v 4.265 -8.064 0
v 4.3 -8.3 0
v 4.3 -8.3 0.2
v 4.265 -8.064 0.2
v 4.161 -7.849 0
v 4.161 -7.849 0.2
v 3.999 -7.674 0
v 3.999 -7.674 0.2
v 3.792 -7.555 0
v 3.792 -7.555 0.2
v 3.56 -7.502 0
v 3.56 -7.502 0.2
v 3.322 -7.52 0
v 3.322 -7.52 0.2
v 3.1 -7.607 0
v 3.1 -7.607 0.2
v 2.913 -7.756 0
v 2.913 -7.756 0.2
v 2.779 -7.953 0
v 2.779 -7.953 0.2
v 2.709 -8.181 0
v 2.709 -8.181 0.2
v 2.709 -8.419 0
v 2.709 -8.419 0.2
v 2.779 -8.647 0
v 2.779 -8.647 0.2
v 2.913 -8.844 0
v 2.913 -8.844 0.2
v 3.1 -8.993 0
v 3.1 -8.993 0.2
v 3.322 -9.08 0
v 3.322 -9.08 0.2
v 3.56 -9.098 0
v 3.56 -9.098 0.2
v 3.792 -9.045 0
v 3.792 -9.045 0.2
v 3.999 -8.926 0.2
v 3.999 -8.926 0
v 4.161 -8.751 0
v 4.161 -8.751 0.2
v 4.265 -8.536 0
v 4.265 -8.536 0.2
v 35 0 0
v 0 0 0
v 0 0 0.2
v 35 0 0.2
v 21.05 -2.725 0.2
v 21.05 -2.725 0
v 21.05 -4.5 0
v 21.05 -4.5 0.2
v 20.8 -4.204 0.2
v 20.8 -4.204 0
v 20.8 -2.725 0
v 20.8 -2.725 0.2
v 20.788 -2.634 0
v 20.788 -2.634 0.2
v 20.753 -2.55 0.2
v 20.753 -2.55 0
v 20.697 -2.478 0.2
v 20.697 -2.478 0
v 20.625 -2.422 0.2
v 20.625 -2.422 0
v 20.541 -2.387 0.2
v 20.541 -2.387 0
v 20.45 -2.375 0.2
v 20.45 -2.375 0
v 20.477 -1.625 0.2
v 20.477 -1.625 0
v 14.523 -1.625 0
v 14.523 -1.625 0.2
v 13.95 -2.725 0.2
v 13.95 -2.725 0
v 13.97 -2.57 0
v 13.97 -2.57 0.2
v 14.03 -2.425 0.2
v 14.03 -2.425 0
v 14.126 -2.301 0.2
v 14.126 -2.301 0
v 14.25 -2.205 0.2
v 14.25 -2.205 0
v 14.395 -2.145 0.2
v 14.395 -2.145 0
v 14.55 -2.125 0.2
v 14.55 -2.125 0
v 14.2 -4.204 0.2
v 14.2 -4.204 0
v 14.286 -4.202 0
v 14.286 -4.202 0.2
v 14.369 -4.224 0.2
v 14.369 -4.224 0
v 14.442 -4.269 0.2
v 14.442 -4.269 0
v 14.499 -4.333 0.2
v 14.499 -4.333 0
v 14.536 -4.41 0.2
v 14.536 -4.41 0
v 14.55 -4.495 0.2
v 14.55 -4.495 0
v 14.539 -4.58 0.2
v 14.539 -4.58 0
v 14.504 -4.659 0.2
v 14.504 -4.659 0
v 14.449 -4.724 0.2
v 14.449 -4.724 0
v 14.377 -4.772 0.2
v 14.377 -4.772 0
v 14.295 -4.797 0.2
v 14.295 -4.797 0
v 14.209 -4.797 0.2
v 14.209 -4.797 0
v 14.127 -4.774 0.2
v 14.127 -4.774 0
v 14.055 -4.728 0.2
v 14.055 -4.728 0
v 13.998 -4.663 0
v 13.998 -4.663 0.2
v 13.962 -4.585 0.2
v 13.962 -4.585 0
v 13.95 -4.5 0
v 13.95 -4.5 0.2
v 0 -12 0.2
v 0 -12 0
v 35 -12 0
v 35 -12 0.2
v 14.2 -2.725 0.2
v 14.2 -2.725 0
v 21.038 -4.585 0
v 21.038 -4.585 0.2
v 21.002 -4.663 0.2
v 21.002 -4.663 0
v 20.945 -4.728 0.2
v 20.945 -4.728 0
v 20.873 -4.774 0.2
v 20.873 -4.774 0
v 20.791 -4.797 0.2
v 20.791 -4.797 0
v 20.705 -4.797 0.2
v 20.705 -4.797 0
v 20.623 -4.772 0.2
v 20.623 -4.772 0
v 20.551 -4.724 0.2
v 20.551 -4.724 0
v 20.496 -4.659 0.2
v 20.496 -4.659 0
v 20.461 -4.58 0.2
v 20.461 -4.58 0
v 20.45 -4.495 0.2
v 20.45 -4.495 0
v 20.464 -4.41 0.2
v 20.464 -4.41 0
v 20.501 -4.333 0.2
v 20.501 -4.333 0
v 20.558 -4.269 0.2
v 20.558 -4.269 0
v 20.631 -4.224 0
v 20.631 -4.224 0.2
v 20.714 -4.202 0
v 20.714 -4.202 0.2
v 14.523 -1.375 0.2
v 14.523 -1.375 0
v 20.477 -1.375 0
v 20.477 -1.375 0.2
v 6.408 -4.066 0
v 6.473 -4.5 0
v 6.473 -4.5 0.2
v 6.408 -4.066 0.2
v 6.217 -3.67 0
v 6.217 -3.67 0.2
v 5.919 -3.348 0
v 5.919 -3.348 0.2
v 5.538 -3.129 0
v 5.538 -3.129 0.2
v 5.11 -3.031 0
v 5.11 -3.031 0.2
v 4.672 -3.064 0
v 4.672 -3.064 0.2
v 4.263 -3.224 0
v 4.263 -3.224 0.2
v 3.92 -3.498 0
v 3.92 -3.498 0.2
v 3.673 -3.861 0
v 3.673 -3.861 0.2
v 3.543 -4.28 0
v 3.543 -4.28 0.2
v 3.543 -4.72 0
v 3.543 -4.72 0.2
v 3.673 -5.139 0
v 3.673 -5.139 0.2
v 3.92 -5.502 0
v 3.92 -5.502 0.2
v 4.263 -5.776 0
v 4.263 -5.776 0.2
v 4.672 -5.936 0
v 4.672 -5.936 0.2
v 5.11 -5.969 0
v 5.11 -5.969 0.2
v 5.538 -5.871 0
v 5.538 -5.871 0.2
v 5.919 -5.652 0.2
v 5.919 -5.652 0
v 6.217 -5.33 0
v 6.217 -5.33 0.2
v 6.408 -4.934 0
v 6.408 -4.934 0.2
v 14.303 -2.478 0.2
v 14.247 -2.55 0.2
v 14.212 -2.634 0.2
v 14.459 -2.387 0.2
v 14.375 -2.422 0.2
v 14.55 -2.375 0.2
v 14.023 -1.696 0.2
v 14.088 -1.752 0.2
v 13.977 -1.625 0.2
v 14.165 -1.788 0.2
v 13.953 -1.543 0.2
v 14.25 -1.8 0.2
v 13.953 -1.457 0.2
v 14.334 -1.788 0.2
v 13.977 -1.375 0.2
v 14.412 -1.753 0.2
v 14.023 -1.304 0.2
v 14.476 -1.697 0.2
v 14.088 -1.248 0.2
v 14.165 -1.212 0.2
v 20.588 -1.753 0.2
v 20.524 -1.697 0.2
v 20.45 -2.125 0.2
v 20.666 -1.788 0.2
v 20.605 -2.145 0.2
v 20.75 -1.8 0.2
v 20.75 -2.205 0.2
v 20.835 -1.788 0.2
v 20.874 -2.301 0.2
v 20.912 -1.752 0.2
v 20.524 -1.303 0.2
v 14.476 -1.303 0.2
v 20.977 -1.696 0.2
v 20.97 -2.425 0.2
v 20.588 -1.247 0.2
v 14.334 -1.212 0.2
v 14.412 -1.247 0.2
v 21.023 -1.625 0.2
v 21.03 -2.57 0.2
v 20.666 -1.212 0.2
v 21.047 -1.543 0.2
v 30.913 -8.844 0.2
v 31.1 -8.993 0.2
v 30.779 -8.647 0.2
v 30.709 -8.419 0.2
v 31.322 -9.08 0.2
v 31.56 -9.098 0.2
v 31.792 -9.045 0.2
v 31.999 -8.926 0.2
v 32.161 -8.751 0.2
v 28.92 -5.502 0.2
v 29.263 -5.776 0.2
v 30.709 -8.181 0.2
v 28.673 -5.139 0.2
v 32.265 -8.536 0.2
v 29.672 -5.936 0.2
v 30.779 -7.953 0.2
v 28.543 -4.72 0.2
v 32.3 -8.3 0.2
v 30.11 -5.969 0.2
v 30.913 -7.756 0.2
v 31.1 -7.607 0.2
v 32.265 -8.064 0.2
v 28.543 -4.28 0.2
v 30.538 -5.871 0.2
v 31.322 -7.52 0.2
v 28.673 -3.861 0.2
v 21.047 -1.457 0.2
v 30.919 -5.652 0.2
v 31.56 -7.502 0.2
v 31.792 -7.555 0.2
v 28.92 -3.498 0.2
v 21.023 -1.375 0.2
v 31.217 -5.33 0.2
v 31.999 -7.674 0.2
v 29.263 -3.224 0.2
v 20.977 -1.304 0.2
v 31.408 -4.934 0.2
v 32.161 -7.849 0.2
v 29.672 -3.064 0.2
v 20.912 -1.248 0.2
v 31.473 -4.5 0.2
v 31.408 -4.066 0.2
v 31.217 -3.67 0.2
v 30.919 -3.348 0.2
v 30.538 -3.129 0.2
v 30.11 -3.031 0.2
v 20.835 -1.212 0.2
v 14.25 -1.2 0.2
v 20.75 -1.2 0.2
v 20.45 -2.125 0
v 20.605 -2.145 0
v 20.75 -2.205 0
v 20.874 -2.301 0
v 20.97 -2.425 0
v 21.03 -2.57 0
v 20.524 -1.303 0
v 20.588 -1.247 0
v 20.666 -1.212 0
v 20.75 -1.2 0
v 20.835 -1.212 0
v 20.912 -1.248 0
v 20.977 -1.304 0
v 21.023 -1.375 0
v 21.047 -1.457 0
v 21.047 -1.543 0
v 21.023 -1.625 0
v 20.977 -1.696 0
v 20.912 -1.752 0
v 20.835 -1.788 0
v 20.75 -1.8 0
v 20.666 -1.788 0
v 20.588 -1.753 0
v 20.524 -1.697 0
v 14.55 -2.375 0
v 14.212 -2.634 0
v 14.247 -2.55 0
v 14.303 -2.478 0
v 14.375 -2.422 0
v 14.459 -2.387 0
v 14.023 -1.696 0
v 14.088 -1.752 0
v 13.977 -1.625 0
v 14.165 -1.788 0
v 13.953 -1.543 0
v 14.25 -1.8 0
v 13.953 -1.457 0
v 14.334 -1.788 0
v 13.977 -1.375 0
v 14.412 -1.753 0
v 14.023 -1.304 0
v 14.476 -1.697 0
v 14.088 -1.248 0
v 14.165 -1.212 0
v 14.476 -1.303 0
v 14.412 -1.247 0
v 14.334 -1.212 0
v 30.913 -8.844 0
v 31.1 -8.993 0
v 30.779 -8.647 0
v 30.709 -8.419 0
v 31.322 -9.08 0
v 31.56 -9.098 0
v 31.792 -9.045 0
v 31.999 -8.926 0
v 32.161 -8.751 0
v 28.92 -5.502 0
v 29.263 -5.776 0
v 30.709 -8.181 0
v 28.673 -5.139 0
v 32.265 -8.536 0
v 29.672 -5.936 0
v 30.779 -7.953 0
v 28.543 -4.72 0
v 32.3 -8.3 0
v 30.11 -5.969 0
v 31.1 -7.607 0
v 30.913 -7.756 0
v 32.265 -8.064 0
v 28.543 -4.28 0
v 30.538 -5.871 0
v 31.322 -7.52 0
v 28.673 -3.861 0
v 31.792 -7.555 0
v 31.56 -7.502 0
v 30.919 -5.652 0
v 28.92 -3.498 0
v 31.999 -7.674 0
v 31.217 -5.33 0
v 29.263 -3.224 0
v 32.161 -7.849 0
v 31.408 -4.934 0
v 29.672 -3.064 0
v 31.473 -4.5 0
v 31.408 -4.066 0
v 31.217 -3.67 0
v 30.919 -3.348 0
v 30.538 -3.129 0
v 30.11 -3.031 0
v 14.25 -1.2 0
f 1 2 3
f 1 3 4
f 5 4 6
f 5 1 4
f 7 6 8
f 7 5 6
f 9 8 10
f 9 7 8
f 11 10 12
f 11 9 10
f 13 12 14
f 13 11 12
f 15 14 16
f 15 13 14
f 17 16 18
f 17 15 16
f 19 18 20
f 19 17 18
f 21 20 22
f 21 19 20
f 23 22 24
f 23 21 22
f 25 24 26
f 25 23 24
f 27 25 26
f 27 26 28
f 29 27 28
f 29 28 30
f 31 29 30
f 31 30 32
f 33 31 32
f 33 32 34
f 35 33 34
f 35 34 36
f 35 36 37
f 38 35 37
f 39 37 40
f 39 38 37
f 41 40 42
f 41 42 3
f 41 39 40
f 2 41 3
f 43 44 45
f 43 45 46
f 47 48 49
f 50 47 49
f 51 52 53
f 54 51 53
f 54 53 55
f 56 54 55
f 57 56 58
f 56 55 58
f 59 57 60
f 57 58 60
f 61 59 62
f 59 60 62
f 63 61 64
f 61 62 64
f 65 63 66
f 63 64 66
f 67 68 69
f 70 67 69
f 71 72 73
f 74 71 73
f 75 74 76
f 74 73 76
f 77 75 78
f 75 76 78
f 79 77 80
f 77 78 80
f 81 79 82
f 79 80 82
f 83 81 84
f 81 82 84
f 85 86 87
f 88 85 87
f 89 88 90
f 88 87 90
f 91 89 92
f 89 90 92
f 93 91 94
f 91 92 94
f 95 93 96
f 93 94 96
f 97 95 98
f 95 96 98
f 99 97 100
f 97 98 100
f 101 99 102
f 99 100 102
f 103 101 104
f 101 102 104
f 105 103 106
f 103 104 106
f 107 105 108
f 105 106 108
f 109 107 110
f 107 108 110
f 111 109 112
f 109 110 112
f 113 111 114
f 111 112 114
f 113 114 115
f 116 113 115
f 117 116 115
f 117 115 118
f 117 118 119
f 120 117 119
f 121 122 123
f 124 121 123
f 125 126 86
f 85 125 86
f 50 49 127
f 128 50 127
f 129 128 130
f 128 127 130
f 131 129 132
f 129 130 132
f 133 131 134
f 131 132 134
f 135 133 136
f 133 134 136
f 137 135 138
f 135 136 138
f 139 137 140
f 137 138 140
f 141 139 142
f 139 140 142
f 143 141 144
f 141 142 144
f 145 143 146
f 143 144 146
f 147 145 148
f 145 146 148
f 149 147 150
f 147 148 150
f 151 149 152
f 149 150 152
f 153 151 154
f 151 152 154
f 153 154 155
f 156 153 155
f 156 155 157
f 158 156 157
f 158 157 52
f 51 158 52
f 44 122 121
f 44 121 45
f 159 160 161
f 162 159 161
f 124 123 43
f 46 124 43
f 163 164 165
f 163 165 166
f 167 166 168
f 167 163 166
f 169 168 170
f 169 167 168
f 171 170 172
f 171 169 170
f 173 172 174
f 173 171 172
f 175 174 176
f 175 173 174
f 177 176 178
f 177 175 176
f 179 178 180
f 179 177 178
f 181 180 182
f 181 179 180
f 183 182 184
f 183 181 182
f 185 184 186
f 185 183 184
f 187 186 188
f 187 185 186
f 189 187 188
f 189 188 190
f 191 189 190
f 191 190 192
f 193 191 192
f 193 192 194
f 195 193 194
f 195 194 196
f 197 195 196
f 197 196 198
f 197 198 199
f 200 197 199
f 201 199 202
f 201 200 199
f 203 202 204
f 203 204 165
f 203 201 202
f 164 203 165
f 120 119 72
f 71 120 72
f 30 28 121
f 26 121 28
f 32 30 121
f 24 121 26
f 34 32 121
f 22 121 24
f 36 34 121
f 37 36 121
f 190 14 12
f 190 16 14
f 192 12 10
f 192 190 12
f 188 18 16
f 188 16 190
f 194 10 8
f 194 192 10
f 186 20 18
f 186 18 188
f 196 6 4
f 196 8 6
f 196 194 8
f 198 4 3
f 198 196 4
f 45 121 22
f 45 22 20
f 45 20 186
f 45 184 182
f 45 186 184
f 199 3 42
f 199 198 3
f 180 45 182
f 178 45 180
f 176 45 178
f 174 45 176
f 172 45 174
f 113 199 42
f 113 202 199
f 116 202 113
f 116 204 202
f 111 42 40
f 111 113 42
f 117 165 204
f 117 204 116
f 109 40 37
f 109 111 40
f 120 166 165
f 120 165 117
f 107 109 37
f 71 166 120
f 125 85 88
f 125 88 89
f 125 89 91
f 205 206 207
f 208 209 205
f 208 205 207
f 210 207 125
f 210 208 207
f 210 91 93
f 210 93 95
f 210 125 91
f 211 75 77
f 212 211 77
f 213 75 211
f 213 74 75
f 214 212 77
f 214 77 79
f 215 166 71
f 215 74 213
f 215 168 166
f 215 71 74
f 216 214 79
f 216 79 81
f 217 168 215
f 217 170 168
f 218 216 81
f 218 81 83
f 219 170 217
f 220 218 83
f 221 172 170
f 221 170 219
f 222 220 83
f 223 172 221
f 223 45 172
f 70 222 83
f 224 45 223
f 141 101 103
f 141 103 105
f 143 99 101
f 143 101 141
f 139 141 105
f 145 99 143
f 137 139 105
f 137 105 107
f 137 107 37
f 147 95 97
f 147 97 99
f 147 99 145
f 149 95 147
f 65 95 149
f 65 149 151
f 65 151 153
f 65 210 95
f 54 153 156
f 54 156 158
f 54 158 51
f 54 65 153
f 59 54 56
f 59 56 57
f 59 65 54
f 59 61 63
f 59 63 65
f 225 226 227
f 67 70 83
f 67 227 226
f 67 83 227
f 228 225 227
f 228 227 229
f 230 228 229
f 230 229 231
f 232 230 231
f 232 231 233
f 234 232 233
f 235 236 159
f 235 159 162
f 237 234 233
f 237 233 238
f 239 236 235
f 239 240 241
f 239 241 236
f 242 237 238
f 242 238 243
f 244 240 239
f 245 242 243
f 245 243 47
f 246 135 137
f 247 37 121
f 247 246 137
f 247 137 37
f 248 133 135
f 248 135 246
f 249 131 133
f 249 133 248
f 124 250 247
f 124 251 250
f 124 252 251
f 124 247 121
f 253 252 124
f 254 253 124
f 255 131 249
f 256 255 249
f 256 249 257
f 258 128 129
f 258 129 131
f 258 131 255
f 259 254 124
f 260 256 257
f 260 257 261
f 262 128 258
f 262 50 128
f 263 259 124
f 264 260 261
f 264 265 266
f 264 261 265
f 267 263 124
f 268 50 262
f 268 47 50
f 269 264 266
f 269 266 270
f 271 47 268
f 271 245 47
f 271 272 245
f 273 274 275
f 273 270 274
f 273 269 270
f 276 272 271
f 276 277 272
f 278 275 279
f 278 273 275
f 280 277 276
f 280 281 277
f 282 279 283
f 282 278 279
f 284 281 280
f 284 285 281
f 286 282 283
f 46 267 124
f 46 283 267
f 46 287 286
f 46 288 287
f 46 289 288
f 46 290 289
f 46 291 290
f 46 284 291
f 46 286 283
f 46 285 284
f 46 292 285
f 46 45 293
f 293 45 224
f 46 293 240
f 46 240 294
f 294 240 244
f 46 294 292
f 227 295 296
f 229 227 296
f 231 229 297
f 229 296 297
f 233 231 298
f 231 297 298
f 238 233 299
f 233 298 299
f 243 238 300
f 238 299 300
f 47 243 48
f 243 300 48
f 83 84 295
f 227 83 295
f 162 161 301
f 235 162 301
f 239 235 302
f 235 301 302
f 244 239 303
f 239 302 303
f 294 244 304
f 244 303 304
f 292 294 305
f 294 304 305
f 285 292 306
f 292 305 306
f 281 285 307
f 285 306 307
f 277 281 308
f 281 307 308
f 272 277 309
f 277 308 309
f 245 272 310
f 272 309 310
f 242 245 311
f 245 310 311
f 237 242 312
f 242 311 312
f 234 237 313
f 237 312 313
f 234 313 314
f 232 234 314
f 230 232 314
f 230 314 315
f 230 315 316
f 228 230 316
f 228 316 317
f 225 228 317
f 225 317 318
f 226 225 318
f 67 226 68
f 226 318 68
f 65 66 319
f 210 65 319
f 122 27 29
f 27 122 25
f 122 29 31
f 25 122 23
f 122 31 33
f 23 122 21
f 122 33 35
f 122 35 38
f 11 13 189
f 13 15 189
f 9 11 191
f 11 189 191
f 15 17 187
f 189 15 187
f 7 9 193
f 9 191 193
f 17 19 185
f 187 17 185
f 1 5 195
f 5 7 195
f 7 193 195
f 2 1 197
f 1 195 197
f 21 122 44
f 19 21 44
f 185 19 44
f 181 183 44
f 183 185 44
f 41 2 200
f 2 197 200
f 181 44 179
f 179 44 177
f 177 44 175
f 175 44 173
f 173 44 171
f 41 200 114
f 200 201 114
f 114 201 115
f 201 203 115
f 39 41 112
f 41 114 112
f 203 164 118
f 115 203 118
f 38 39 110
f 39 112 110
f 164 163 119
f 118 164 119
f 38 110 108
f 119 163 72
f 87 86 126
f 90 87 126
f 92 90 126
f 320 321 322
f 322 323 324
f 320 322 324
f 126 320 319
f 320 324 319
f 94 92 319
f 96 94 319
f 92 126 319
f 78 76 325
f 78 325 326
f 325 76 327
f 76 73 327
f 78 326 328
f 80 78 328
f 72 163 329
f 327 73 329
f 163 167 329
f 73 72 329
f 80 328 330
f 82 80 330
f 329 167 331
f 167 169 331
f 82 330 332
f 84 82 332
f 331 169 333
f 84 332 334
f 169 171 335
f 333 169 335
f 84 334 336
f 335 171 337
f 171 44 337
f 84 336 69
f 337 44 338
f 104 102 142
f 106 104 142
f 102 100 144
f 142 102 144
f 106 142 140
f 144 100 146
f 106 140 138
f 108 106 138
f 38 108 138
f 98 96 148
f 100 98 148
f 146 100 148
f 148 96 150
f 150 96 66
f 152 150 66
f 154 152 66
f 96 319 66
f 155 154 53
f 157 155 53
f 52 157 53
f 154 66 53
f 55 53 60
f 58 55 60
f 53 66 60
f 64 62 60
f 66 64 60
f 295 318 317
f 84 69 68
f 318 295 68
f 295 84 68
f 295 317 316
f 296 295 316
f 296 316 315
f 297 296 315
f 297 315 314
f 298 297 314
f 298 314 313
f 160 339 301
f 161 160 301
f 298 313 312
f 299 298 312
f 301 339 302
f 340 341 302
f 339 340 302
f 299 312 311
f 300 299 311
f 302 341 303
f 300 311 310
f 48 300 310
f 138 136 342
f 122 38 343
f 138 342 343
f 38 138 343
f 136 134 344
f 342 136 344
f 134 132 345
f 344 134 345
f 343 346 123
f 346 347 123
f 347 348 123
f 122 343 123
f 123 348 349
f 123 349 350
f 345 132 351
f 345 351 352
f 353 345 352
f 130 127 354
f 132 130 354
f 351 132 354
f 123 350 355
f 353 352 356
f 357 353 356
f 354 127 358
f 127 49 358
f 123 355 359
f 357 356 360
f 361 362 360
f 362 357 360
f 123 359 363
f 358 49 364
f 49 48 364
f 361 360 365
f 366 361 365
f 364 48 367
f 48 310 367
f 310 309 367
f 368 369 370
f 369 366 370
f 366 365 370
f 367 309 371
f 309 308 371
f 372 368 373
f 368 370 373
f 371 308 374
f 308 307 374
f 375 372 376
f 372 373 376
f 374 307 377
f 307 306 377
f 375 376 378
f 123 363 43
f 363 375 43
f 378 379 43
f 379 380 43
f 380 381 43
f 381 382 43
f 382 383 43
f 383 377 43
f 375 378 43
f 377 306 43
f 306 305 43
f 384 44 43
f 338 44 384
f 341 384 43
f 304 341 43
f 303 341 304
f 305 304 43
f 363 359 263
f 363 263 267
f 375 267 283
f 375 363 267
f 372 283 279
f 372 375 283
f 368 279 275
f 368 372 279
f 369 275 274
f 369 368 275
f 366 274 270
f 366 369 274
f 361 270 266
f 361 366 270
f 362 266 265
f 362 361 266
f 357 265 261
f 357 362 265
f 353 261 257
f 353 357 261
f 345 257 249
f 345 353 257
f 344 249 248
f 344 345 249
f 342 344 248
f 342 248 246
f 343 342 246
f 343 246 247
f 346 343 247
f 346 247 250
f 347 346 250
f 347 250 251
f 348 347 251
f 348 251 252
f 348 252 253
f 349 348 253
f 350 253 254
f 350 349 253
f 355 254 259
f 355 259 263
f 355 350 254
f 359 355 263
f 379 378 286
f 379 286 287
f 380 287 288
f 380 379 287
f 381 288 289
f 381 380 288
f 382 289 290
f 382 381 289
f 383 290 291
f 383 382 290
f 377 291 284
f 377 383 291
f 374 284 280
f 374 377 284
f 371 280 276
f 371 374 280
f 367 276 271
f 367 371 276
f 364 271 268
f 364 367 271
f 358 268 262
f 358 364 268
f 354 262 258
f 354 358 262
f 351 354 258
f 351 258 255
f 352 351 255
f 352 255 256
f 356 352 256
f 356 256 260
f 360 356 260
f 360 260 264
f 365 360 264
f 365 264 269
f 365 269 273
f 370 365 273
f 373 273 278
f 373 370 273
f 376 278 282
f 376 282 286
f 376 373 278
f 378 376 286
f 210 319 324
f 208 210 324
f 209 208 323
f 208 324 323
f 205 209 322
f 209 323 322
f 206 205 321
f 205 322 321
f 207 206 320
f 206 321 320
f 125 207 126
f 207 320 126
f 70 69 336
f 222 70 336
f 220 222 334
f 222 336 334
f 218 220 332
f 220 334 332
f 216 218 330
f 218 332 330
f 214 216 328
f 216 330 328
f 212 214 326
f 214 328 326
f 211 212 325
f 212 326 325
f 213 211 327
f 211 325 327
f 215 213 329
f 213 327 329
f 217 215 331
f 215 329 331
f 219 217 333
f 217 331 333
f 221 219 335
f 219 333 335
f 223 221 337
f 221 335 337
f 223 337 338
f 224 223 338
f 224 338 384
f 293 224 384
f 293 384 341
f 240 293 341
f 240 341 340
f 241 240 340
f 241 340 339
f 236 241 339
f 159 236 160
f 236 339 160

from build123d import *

# Parameters (mm, degrees)
SKETCH1_W           = 35
SKETCH1_H           = 12
SKETCH1_R           = 0.8001
SKETCH1_R_2         = 1.4732
BOSS_EXTRUDE1_DEPTH = 0.2


with BuildPart() as part:
    # Sketch1 → Boss-Extrude1 (new body)
    with BuildSketch(Plane.XY):
        with Locations((17.5, -6)):
            Rectangle(SKETCH1_W, SKETCH1_H)
        with Locations((3.5, -8.3)):
            Circle(SKETCH1_R, mode=Mode.SUBTRACT)
        with Locations((5, -4.5)):
            Circle(SKETCH1_R_2, mode=Mode.SUBTRACT)
        with Locations((30, -4.5)):
            Circle(SKETCH1_R_2, mode=Mode.SUBTRACT)
        with Locations((31.5, -8.3)):
            Circle(SKETCH1_R, mode=Mode.SUBTRACT)
        with BuildLine():
            Line((14.522717803, -1.375), (20.477282197, -1.375))
            ThreePointArc((20.477282197, -1.375), (21.05, -1.5), (20.477282197, -1.625))
            Line((20.477282197, -1.625), (14.522717803, -1.625))
            ThreePointArc((14.522717803, -1.625), (13.95, -1.5), (14.522717803, -1.375))
        make_face(mode=Mode.SUBTRACT)
        with BuildLine():
            Line((13.95, -4.5), (13.95, -2.725))
            ThreePointArc((13.95, -2.725), (14.125735931, -2.300735931), (14.55, -2.125))
            Line((14.55, -2.125), (20.45, -2.125))
            ThreePointArc((20.45, -2.125), (20.874264069, -2.300735931), (21.05, -2.725))
            Line((21.05, -2.725), (21.05, -4.5))
            ThreePointArc((21.05, -4.5), (20.520871215, -4.693649167), (20.8, -4.204196011))
            Line((20.8, -4.204196011), (20.8, -2.725))
            ThreePointArc((20.8, -2.725), (20.697487373, -2.477512627), (20.45, -2.375))
            Line((20.45, -2.375), (14.55, -2.375))
            ThreePointArc((14.55, -2.375), (14.302512627, -2.477512627), (14.2, -2.725))
            Line((14.2, -2.725), (14.2, -4.204196011))
            ThreePointArc((14.2, -4.204196011), (14.479128785, -4.693649167), (13.95, -4.5))
        make_face(mode=Mode.SUBTRACT)
    extrude(amount=BOSS_EXTRUDE1_DEPTH)


solid = part.part
